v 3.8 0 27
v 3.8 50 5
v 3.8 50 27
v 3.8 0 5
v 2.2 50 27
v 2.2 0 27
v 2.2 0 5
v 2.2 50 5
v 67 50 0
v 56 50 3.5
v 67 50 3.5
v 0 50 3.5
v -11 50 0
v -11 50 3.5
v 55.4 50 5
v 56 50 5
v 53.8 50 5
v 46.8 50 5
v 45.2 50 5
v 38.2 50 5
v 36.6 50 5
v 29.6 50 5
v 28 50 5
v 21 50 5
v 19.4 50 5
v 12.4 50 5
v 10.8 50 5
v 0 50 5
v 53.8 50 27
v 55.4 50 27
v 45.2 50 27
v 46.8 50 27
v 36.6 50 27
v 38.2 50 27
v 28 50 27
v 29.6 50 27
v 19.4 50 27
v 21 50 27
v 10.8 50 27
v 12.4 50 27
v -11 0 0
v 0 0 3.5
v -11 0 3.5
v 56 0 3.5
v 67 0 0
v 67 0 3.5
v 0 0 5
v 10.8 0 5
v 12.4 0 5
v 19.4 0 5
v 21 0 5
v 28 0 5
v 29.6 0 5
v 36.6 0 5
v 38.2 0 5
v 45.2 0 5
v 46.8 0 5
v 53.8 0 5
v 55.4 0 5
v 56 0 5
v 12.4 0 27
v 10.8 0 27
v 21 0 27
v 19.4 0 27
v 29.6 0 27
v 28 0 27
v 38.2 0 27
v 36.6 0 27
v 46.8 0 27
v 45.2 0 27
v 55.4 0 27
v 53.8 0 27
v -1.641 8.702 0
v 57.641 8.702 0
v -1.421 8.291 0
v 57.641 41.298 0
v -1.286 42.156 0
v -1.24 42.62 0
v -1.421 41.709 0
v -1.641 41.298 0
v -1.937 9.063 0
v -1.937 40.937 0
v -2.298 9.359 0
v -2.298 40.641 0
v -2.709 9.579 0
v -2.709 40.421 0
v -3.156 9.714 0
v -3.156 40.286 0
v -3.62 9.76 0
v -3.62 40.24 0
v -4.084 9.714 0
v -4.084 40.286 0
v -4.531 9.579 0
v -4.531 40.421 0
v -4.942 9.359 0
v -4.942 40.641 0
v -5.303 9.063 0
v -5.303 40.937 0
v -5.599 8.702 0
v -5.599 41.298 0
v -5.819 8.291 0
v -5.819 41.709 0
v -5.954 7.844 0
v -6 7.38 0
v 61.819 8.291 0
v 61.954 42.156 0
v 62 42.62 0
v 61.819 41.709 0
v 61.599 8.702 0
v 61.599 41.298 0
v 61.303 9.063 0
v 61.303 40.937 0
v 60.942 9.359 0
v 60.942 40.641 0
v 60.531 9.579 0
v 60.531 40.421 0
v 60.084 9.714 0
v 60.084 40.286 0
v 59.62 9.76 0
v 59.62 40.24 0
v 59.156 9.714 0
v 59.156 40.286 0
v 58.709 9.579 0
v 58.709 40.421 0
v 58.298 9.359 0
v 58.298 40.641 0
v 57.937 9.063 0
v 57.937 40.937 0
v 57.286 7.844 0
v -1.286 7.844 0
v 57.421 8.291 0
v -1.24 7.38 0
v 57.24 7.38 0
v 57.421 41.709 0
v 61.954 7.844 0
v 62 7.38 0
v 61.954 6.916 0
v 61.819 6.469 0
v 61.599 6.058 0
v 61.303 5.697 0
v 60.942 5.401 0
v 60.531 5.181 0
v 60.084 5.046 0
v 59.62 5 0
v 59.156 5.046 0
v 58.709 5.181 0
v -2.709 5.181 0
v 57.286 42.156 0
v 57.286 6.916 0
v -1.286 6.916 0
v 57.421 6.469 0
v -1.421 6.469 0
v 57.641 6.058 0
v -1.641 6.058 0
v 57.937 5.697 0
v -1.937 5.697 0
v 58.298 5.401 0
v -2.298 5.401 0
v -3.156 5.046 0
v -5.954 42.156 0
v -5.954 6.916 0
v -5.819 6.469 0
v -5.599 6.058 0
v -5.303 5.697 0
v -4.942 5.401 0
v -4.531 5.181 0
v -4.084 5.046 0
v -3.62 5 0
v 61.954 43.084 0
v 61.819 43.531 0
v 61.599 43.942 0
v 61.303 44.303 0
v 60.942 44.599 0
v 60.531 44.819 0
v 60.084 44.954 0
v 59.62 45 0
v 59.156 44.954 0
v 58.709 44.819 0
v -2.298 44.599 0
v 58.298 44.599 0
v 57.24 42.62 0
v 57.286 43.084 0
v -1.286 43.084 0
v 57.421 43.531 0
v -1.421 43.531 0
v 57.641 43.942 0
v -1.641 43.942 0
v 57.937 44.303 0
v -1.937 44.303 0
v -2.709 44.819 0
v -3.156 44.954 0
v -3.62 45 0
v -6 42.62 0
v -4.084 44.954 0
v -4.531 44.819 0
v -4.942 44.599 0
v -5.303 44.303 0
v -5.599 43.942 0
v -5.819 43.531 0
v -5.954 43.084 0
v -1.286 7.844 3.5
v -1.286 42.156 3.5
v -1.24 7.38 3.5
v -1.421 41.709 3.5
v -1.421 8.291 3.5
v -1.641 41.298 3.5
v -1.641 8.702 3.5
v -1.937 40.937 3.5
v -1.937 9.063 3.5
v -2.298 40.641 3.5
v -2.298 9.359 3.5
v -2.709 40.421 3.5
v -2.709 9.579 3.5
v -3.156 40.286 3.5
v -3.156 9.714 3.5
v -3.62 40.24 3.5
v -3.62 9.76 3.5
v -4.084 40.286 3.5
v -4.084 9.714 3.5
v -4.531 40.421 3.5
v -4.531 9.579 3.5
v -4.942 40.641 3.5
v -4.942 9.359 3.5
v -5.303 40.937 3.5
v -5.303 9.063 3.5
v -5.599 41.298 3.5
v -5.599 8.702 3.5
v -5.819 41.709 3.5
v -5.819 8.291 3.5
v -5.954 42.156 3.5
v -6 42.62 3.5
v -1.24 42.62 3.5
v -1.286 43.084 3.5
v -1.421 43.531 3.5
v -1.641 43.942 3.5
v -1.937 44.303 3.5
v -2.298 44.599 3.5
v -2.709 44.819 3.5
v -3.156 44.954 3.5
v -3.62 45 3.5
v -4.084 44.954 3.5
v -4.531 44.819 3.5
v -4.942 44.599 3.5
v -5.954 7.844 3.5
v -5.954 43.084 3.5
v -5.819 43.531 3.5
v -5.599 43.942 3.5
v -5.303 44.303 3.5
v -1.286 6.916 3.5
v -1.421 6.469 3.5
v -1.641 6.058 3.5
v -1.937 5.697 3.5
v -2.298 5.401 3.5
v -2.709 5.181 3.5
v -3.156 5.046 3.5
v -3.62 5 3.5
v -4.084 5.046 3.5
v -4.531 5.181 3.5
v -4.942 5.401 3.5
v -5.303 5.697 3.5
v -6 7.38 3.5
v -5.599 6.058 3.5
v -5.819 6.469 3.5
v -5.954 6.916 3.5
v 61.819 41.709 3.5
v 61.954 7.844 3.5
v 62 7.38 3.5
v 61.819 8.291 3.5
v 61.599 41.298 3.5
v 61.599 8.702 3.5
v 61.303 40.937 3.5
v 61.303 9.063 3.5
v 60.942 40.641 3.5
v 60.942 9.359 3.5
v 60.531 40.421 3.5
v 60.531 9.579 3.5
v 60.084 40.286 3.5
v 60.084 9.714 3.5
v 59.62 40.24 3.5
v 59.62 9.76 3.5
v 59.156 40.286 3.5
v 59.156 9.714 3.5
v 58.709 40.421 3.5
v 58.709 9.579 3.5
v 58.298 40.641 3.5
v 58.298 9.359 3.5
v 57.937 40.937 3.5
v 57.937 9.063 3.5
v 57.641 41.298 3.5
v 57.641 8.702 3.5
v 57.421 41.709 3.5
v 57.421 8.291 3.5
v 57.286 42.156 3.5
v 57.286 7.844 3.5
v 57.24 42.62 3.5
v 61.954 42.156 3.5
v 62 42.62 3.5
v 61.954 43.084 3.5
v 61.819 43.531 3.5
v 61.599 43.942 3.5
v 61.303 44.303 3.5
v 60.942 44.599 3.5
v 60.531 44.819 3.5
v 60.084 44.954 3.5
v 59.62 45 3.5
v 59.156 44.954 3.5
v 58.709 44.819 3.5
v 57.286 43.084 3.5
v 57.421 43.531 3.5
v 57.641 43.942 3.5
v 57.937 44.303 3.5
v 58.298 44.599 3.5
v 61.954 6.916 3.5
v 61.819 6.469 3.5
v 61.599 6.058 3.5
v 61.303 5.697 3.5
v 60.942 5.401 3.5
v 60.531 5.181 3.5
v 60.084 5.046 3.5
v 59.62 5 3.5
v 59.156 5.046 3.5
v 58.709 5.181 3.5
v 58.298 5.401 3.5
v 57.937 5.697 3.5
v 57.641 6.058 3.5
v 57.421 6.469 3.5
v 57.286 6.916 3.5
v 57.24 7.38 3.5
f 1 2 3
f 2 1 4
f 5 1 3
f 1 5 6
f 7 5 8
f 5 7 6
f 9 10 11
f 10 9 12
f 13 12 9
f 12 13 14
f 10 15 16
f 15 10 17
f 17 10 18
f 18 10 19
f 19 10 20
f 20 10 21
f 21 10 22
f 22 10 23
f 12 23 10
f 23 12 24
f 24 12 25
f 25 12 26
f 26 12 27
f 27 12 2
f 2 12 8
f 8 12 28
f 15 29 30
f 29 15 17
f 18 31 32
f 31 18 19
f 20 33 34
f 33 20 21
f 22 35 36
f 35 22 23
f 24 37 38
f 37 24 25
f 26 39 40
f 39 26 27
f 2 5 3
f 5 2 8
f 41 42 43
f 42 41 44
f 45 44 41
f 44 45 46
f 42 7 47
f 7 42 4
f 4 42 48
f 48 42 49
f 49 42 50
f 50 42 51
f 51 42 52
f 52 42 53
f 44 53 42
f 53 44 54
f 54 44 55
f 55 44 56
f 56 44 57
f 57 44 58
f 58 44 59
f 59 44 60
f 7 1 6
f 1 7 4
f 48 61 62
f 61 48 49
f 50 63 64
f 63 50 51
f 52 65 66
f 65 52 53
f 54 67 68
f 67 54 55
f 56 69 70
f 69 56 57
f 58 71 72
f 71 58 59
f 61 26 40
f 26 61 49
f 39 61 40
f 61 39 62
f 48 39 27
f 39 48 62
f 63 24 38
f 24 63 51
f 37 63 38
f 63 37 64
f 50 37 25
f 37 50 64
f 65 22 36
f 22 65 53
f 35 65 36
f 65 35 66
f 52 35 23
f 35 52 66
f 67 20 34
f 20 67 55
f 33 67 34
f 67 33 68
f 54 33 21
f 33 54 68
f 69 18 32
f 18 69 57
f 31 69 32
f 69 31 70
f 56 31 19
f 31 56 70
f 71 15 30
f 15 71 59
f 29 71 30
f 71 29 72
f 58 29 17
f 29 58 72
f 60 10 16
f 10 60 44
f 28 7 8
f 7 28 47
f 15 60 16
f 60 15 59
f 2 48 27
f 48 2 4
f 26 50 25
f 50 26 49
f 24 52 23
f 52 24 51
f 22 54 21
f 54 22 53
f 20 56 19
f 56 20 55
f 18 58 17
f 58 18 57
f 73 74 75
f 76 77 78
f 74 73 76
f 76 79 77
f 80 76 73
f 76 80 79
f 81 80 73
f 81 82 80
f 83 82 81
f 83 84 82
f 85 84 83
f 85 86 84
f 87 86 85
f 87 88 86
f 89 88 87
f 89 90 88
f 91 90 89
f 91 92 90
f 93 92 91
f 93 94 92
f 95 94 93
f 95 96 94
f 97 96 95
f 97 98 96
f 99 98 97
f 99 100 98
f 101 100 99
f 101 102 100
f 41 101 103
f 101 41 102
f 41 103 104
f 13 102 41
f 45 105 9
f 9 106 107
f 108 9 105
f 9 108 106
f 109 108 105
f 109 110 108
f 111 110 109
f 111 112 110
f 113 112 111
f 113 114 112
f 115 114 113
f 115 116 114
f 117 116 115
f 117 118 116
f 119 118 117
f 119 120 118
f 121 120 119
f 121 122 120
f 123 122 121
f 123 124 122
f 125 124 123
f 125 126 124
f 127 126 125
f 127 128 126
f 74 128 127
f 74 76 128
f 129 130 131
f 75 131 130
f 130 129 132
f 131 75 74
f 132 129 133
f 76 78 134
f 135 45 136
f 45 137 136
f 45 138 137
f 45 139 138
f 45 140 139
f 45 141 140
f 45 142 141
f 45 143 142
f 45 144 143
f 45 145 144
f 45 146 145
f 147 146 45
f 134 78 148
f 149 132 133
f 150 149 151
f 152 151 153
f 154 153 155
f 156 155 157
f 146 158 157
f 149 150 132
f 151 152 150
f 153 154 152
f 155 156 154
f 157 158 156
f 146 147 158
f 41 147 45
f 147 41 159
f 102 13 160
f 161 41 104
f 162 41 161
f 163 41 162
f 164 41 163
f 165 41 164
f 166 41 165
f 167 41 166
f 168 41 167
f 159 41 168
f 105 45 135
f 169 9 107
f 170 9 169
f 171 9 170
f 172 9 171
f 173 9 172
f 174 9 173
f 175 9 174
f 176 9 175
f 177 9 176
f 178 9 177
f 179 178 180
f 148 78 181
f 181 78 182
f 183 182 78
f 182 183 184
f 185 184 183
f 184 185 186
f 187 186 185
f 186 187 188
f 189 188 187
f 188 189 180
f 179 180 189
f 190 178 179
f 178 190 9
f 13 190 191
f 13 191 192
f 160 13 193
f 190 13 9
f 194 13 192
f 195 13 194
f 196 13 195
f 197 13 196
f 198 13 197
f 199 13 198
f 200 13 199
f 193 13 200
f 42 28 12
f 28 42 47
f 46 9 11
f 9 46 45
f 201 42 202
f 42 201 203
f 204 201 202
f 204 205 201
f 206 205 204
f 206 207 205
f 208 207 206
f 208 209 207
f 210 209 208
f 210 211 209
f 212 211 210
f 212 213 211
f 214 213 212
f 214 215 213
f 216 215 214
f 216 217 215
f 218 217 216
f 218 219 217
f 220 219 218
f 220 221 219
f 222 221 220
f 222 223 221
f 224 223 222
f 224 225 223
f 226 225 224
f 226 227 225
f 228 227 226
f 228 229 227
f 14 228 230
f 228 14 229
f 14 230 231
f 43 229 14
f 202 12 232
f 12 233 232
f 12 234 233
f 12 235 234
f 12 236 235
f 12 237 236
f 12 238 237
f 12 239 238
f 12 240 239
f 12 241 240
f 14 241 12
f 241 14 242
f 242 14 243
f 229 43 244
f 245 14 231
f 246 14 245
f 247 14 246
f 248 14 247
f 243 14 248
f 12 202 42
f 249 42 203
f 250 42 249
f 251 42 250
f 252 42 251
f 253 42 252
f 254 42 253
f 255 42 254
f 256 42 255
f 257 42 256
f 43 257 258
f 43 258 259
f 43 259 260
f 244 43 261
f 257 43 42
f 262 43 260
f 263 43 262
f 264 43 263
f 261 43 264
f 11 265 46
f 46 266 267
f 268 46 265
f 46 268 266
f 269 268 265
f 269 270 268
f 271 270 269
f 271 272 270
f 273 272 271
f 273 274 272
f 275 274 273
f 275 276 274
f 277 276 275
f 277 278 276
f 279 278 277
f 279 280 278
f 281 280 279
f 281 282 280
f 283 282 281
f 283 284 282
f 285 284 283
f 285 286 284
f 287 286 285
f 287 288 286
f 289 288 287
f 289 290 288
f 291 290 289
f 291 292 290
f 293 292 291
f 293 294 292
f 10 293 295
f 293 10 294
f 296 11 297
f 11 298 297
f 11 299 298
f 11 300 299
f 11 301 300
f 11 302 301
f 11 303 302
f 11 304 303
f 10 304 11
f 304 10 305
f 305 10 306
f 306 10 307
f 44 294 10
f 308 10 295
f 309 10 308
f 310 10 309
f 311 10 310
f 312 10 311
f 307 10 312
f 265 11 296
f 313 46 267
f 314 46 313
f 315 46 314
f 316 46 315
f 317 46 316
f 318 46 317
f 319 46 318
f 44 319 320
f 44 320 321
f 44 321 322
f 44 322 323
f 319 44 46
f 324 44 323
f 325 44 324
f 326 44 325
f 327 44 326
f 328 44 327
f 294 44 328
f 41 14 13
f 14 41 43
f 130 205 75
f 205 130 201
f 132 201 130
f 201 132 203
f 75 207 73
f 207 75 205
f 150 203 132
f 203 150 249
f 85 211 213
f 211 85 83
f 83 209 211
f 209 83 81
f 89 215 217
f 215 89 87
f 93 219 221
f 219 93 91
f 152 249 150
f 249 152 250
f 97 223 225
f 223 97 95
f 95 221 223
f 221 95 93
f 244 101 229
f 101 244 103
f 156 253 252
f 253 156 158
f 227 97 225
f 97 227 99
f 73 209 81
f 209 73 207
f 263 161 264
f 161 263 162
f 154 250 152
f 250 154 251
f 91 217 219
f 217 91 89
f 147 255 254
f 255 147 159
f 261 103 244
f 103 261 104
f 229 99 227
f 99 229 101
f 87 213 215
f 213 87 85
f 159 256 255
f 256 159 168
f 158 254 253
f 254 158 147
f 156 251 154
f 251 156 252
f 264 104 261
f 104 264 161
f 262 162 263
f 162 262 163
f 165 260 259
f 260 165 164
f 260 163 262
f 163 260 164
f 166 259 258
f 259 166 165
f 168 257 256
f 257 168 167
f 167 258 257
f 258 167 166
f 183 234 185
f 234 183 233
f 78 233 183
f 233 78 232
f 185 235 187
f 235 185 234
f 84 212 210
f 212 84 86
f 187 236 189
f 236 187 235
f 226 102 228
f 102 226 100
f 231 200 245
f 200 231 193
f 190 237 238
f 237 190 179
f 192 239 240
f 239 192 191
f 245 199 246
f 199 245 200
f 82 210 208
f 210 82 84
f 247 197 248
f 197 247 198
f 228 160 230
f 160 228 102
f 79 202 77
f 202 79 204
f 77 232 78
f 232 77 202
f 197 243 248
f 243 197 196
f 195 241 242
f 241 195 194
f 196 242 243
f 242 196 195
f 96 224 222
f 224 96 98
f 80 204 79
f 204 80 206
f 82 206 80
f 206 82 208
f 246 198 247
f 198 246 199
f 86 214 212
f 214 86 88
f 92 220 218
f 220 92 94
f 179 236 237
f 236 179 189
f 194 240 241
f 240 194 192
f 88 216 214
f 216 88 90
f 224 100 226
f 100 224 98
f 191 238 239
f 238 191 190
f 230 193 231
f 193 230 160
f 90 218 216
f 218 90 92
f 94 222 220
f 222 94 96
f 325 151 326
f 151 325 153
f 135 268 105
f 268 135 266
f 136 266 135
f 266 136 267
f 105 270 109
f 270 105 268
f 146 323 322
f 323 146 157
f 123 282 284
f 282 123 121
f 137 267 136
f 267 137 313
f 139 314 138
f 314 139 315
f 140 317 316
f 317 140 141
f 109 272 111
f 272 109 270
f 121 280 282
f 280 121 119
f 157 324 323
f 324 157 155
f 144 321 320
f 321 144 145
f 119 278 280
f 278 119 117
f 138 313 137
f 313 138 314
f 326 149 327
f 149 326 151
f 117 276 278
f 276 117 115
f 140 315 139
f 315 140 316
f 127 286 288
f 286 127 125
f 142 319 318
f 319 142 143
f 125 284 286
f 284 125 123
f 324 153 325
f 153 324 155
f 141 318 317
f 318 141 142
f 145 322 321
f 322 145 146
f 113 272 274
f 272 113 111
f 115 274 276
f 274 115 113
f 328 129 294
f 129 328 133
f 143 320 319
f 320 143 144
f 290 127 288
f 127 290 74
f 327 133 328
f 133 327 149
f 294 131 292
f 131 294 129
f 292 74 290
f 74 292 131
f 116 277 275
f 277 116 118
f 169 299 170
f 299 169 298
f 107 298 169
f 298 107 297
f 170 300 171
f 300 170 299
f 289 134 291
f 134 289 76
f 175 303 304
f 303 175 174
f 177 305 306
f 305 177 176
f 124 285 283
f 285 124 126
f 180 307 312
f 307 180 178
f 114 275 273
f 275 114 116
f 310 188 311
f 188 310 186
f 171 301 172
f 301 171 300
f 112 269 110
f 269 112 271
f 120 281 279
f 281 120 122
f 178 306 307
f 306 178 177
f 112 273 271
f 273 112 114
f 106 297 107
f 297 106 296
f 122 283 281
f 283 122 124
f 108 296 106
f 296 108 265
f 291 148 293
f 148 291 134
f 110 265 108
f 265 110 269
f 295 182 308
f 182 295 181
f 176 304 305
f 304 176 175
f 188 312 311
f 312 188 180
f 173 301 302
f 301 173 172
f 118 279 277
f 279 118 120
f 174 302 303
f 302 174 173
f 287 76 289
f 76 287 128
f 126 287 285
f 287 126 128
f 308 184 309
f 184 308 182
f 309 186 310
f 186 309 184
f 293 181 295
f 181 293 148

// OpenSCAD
$fn = 32;

// ----------------------------------------------------------------------
// Finned heat sink: 56 x 50 mm base, 22 mm fins
// ----------------------------------------------------------------------

// --- parameters (mm) ---
base_w = 56;              // base width
base_d = 50;              // base depth
base_t = 5;               // base thickness
fin_h = 22;               // fin height above the base
holes_d = 4.76;           // fixing holes
hole_x = 31.62;           // hole offset in x
hole_y = 17.62;           // hole offset in y
fin_t = 1.6;              // fin thickness
fin_pitch = 8.6;          // fin pitch
fin_count = 7;            // number of fins
fin_x0 = 2.2;             // first fin offset
flange_w = 78;            // flange plate width
flange_t = 3;             // flange plate thickness

difference() {
  union() {
    cube([base_w, base_d, base_t]);
    for (i = [0 : fin_count - 1]) {
      translate([fin_x0 + i * fin_pitch, 0, base_t - 0.5]) cube([fin_t, base_d, fin_h + 0.5]);
    }
    /* mounting flange, a wider plate sharing the base bottom */
    translate([(base_w - flange_w) / 2, 0, 0]) cube([flange_w, base_d, flange_t + 0.5]);
  }
  /* fixing holes through the base, 2.5 mm clear on both sides */
  for (hx = [-31.62, 31.62]) {
    for (hy = [-17.62, 17.62]) {
      translate([base_w / 2 + hx, base_d / 2 + hy, -2.5]) cylinder(h = base_t + 5, d = holes_d);
    }
  }
}
